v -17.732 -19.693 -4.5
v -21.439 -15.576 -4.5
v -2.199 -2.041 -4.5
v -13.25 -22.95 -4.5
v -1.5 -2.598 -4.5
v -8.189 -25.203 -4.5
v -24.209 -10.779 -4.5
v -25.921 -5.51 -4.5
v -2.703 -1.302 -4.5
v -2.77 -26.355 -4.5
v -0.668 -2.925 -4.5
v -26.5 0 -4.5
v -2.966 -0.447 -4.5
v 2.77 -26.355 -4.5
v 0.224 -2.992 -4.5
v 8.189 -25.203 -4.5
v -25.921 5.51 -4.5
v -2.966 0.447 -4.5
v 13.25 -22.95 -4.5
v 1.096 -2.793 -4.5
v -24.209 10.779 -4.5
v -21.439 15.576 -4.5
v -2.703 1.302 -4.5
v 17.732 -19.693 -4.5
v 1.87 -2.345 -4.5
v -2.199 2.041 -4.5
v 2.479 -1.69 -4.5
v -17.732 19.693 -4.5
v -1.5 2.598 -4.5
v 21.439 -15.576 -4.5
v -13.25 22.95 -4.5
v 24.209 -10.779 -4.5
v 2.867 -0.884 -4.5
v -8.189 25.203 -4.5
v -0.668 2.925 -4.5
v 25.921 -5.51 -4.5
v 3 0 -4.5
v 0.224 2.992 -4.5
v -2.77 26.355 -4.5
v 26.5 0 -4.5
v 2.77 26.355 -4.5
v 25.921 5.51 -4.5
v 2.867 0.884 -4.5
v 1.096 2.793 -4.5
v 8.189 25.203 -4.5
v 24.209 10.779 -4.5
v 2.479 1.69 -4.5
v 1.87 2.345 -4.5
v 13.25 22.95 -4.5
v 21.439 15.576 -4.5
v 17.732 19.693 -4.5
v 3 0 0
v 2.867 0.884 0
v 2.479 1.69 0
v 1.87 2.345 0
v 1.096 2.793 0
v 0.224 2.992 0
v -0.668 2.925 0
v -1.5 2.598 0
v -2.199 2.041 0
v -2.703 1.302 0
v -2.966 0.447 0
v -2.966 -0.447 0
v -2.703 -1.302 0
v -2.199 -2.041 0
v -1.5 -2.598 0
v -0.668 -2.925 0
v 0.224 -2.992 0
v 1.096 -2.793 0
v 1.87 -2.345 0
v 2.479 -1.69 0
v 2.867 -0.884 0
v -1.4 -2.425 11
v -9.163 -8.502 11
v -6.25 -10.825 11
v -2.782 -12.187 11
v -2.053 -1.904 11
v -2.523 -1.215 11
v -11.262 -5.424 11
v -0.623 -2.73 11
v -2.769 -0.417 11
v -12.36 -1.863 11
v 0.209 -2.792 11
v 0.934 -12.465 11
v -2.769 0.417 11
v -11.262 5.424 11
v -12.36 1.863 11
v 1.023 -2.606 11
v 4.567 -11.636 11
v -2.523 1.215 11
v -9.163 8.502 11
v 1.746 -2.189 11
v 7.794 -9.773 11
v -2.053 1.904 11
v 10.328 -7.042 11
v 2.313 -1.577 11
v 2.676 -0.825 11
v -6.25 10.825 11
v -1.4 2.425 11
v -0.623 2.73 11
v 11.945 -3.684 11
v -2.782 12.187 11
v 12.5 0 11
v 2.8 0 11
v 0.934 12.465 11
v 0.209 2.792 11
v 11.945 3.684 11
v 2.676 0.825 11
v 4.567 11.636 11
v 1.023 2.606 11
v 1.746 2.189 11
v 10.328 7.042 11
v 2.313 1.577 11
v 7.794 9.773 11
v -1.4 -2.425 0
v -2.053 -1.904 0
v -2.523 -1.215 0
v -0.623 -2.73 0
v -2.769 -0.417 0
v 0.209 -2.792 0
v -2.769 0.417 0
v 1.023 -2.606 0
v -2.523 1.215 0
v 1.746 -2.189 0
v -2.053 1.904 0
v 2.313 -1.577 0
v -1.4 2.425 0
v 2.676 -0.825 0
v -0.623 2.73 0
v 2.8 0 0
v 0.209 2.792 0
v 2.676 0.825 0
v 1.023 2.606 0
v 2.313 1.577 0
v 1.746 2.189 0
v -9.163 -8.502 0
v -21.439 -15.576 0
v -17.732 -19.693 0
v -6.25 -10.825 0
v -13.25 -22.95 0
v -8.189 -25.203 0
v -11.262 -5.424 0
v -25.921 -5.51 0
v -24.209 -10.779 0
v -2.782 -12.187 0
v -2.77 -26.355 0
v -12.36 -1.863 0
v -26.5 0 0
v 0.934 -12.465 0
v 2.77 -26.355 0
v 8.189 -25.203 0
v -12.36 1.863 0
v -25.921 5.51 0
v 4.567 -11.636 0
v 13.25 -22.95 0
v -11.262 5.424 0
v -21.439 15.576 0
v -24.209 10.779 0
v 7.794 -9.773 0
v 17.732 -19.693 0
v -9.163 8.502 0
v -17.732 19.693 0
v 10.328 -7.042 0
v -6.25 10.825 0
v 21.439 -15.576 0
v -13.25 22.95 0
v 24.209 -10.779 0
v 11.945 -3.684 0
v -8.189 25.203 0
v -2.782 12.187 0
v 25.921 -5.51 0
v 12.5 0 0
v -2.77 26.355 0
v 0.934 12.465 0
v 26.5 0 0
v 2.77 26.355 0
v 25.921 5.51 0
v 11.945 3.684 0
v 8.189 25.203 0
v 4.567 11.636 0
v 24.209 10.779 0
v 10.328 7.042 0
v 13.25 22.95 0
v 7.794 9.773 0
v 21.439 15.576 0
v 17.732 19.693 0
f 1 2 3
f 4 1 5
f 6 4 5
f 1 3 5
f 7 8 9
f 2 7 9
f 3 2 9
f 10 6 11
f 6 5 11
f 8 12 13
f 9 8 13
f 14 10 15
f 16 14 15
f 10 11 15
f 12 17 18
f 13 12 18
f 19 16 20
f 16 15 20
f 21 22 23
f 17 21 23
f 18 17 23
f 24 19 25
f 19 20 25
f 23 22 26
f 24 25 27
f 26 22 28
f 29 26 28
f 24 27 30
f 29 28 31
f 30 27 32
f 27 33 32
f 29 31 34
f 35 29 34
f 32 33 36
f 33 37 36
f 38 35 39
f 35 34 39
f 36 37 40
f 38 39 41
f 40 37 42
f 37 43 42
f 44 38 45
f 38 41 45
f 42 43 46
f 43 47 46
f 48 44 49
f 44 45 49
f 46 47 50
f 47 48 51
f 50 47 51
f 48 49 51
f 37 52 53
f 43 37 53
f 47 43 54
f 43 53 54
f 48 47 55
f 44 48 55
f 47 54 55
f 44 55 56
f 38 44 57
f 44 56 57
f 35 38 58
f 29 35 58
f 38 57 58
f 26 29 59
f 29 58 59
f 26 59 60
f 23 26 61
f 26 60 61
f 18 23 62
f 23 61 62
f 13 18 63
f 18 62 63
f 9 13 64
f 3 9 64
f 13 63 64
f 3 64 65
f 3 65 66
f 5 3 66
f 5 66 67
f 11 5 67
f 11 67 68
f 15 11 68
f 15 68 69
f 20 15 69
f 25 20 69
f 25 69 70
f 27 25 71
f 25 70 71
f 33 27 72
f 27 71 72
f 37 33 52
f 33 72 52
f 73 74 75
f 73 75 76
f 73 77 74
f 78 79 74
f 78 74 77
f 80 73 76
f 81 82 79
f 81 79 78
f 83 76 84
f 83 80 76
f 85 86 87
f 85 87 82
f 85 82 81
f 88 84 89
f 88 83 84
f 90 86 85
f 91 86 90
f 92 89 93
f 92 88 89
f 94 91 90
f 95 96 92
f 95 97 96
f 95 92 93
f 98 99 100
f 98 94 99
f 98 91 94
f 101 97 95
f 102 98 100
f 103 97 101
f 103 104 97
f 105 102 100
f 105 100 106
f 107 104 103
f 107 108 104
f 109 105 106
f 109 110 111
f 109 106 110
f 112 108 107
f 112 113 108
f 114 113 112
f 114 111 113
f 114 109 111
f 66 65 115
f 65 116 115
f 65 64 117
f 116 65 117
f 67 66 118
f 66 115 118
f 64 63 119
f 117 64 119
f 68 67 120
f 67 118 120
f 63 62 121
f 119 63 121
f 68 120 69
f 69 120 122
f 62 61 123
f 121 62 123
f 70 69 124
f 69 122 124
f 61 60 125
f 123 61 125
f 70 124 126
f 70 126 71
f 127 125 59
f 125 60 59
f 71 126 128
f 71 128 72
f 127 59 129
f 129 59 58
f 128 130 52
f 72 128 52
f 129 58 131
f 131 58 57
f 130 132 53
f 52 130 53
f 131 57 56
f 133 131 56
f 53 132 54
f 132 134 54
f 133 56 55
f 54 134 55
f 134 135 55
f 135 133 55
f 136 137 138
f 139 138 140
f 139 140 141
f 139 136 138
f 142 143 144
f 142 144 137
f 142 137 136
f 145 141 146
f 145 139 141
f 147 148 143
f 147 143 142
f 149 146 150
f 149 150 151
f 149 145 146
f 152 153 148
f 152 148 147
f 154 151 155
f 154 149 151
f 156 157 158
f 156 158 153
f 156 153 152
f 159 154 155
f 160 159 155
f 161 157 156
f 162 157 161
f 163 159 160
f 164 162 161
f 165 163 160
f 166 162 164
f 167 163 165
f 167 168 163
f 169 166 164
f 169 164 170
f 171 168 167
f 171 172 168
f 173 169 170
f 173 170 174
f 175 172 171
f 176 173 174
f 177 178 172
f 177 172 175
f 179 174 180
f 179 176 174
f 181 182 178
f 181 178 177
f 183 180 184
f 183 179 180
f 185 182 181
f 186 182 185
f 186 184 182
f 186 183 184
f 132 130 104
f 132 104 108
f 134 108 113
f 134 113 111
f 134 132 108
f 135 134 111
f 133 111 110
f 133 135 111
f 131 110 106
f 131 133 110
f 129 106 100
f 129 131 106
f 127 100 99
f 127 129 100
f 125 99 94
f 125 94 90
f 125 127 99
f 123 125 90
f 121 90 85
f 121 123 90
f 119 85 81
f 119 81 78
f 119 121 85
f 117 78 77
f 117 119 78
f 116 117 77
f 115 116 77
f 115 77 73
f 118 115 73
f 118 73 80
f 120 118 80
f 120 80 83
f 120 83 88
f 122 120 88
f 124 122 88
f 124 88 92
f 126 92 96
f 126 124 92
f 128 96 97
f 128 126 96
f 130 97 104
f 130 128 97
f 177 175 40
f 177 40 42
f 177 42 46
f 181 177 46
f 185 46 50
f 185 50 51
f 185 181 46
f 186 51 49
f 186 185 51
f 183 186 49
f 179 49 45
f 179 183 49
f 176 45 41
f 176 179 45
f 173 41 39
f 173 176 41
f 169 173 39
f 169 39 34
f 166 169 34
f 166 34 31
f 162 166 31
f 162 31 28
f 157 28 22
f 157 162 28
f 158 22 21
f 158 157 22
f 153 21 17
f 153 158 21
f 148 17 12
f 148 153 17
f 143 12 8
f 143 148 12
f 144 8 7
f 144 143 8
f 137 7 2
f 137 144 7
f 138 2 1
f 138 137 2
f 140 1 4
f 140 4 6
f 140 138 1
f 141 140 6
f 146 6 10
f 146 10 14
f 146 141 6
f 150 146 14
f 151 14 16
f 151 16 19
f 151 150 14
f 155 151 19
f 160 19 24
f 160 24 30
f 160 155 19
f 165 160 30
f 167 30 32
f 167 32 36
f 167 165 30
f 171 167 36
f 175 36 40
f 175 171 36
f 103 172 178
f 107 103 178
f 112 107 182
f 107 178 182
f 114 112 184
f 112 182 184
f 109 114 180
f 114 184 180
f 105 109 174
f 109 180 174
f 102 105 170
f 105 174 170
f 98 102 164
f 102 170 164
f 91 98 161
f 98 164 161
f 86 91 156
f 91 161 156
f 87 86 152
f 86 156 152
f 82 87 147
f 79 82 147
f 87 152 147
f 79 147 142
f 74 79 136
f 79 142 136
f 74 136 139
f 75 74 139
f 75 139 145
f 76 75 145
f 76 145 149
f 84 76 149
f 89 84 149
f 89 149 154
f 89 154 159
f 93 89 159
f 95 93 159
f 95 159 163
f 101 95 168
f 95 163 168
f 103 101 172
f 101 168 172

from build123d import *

# Parameters (mm, degrees)
ESQUISSE1_R        = 26.5
ESQUISSE1_R_2      = 3
BOSS_EXTRU_1_DEPTH = 4.5
ESQUISSE2_R        = 12.5
ESQUISSE2_R_2      = 2.8
BOSS_EXTRU_2_DEPTH = 11


with BuildPart() as part:
    # Esquisse1 → Boss.-Extru.1 (new body)
    with BuildSketch(Plane.XY):
        Circle(ESQUISSE1_R)
        Circle(ESQUISSE1_R_2, mode=Mode.SUBTRACT)
    extrude(amount=-BOSS_EXTRU_1_DEPTH)

    # Esquisse2 → Boss.-Extru.2 (add)
    with BuildSketch(Plane.XY):
        Circle(ESQUISSE2_R)
        Circle(ESQUISSE2_R_2, mode=Mode.SUBTRACT)
    extrude(amount=BOSS_EXTRU_2_DEPTH)


solid = part.part
